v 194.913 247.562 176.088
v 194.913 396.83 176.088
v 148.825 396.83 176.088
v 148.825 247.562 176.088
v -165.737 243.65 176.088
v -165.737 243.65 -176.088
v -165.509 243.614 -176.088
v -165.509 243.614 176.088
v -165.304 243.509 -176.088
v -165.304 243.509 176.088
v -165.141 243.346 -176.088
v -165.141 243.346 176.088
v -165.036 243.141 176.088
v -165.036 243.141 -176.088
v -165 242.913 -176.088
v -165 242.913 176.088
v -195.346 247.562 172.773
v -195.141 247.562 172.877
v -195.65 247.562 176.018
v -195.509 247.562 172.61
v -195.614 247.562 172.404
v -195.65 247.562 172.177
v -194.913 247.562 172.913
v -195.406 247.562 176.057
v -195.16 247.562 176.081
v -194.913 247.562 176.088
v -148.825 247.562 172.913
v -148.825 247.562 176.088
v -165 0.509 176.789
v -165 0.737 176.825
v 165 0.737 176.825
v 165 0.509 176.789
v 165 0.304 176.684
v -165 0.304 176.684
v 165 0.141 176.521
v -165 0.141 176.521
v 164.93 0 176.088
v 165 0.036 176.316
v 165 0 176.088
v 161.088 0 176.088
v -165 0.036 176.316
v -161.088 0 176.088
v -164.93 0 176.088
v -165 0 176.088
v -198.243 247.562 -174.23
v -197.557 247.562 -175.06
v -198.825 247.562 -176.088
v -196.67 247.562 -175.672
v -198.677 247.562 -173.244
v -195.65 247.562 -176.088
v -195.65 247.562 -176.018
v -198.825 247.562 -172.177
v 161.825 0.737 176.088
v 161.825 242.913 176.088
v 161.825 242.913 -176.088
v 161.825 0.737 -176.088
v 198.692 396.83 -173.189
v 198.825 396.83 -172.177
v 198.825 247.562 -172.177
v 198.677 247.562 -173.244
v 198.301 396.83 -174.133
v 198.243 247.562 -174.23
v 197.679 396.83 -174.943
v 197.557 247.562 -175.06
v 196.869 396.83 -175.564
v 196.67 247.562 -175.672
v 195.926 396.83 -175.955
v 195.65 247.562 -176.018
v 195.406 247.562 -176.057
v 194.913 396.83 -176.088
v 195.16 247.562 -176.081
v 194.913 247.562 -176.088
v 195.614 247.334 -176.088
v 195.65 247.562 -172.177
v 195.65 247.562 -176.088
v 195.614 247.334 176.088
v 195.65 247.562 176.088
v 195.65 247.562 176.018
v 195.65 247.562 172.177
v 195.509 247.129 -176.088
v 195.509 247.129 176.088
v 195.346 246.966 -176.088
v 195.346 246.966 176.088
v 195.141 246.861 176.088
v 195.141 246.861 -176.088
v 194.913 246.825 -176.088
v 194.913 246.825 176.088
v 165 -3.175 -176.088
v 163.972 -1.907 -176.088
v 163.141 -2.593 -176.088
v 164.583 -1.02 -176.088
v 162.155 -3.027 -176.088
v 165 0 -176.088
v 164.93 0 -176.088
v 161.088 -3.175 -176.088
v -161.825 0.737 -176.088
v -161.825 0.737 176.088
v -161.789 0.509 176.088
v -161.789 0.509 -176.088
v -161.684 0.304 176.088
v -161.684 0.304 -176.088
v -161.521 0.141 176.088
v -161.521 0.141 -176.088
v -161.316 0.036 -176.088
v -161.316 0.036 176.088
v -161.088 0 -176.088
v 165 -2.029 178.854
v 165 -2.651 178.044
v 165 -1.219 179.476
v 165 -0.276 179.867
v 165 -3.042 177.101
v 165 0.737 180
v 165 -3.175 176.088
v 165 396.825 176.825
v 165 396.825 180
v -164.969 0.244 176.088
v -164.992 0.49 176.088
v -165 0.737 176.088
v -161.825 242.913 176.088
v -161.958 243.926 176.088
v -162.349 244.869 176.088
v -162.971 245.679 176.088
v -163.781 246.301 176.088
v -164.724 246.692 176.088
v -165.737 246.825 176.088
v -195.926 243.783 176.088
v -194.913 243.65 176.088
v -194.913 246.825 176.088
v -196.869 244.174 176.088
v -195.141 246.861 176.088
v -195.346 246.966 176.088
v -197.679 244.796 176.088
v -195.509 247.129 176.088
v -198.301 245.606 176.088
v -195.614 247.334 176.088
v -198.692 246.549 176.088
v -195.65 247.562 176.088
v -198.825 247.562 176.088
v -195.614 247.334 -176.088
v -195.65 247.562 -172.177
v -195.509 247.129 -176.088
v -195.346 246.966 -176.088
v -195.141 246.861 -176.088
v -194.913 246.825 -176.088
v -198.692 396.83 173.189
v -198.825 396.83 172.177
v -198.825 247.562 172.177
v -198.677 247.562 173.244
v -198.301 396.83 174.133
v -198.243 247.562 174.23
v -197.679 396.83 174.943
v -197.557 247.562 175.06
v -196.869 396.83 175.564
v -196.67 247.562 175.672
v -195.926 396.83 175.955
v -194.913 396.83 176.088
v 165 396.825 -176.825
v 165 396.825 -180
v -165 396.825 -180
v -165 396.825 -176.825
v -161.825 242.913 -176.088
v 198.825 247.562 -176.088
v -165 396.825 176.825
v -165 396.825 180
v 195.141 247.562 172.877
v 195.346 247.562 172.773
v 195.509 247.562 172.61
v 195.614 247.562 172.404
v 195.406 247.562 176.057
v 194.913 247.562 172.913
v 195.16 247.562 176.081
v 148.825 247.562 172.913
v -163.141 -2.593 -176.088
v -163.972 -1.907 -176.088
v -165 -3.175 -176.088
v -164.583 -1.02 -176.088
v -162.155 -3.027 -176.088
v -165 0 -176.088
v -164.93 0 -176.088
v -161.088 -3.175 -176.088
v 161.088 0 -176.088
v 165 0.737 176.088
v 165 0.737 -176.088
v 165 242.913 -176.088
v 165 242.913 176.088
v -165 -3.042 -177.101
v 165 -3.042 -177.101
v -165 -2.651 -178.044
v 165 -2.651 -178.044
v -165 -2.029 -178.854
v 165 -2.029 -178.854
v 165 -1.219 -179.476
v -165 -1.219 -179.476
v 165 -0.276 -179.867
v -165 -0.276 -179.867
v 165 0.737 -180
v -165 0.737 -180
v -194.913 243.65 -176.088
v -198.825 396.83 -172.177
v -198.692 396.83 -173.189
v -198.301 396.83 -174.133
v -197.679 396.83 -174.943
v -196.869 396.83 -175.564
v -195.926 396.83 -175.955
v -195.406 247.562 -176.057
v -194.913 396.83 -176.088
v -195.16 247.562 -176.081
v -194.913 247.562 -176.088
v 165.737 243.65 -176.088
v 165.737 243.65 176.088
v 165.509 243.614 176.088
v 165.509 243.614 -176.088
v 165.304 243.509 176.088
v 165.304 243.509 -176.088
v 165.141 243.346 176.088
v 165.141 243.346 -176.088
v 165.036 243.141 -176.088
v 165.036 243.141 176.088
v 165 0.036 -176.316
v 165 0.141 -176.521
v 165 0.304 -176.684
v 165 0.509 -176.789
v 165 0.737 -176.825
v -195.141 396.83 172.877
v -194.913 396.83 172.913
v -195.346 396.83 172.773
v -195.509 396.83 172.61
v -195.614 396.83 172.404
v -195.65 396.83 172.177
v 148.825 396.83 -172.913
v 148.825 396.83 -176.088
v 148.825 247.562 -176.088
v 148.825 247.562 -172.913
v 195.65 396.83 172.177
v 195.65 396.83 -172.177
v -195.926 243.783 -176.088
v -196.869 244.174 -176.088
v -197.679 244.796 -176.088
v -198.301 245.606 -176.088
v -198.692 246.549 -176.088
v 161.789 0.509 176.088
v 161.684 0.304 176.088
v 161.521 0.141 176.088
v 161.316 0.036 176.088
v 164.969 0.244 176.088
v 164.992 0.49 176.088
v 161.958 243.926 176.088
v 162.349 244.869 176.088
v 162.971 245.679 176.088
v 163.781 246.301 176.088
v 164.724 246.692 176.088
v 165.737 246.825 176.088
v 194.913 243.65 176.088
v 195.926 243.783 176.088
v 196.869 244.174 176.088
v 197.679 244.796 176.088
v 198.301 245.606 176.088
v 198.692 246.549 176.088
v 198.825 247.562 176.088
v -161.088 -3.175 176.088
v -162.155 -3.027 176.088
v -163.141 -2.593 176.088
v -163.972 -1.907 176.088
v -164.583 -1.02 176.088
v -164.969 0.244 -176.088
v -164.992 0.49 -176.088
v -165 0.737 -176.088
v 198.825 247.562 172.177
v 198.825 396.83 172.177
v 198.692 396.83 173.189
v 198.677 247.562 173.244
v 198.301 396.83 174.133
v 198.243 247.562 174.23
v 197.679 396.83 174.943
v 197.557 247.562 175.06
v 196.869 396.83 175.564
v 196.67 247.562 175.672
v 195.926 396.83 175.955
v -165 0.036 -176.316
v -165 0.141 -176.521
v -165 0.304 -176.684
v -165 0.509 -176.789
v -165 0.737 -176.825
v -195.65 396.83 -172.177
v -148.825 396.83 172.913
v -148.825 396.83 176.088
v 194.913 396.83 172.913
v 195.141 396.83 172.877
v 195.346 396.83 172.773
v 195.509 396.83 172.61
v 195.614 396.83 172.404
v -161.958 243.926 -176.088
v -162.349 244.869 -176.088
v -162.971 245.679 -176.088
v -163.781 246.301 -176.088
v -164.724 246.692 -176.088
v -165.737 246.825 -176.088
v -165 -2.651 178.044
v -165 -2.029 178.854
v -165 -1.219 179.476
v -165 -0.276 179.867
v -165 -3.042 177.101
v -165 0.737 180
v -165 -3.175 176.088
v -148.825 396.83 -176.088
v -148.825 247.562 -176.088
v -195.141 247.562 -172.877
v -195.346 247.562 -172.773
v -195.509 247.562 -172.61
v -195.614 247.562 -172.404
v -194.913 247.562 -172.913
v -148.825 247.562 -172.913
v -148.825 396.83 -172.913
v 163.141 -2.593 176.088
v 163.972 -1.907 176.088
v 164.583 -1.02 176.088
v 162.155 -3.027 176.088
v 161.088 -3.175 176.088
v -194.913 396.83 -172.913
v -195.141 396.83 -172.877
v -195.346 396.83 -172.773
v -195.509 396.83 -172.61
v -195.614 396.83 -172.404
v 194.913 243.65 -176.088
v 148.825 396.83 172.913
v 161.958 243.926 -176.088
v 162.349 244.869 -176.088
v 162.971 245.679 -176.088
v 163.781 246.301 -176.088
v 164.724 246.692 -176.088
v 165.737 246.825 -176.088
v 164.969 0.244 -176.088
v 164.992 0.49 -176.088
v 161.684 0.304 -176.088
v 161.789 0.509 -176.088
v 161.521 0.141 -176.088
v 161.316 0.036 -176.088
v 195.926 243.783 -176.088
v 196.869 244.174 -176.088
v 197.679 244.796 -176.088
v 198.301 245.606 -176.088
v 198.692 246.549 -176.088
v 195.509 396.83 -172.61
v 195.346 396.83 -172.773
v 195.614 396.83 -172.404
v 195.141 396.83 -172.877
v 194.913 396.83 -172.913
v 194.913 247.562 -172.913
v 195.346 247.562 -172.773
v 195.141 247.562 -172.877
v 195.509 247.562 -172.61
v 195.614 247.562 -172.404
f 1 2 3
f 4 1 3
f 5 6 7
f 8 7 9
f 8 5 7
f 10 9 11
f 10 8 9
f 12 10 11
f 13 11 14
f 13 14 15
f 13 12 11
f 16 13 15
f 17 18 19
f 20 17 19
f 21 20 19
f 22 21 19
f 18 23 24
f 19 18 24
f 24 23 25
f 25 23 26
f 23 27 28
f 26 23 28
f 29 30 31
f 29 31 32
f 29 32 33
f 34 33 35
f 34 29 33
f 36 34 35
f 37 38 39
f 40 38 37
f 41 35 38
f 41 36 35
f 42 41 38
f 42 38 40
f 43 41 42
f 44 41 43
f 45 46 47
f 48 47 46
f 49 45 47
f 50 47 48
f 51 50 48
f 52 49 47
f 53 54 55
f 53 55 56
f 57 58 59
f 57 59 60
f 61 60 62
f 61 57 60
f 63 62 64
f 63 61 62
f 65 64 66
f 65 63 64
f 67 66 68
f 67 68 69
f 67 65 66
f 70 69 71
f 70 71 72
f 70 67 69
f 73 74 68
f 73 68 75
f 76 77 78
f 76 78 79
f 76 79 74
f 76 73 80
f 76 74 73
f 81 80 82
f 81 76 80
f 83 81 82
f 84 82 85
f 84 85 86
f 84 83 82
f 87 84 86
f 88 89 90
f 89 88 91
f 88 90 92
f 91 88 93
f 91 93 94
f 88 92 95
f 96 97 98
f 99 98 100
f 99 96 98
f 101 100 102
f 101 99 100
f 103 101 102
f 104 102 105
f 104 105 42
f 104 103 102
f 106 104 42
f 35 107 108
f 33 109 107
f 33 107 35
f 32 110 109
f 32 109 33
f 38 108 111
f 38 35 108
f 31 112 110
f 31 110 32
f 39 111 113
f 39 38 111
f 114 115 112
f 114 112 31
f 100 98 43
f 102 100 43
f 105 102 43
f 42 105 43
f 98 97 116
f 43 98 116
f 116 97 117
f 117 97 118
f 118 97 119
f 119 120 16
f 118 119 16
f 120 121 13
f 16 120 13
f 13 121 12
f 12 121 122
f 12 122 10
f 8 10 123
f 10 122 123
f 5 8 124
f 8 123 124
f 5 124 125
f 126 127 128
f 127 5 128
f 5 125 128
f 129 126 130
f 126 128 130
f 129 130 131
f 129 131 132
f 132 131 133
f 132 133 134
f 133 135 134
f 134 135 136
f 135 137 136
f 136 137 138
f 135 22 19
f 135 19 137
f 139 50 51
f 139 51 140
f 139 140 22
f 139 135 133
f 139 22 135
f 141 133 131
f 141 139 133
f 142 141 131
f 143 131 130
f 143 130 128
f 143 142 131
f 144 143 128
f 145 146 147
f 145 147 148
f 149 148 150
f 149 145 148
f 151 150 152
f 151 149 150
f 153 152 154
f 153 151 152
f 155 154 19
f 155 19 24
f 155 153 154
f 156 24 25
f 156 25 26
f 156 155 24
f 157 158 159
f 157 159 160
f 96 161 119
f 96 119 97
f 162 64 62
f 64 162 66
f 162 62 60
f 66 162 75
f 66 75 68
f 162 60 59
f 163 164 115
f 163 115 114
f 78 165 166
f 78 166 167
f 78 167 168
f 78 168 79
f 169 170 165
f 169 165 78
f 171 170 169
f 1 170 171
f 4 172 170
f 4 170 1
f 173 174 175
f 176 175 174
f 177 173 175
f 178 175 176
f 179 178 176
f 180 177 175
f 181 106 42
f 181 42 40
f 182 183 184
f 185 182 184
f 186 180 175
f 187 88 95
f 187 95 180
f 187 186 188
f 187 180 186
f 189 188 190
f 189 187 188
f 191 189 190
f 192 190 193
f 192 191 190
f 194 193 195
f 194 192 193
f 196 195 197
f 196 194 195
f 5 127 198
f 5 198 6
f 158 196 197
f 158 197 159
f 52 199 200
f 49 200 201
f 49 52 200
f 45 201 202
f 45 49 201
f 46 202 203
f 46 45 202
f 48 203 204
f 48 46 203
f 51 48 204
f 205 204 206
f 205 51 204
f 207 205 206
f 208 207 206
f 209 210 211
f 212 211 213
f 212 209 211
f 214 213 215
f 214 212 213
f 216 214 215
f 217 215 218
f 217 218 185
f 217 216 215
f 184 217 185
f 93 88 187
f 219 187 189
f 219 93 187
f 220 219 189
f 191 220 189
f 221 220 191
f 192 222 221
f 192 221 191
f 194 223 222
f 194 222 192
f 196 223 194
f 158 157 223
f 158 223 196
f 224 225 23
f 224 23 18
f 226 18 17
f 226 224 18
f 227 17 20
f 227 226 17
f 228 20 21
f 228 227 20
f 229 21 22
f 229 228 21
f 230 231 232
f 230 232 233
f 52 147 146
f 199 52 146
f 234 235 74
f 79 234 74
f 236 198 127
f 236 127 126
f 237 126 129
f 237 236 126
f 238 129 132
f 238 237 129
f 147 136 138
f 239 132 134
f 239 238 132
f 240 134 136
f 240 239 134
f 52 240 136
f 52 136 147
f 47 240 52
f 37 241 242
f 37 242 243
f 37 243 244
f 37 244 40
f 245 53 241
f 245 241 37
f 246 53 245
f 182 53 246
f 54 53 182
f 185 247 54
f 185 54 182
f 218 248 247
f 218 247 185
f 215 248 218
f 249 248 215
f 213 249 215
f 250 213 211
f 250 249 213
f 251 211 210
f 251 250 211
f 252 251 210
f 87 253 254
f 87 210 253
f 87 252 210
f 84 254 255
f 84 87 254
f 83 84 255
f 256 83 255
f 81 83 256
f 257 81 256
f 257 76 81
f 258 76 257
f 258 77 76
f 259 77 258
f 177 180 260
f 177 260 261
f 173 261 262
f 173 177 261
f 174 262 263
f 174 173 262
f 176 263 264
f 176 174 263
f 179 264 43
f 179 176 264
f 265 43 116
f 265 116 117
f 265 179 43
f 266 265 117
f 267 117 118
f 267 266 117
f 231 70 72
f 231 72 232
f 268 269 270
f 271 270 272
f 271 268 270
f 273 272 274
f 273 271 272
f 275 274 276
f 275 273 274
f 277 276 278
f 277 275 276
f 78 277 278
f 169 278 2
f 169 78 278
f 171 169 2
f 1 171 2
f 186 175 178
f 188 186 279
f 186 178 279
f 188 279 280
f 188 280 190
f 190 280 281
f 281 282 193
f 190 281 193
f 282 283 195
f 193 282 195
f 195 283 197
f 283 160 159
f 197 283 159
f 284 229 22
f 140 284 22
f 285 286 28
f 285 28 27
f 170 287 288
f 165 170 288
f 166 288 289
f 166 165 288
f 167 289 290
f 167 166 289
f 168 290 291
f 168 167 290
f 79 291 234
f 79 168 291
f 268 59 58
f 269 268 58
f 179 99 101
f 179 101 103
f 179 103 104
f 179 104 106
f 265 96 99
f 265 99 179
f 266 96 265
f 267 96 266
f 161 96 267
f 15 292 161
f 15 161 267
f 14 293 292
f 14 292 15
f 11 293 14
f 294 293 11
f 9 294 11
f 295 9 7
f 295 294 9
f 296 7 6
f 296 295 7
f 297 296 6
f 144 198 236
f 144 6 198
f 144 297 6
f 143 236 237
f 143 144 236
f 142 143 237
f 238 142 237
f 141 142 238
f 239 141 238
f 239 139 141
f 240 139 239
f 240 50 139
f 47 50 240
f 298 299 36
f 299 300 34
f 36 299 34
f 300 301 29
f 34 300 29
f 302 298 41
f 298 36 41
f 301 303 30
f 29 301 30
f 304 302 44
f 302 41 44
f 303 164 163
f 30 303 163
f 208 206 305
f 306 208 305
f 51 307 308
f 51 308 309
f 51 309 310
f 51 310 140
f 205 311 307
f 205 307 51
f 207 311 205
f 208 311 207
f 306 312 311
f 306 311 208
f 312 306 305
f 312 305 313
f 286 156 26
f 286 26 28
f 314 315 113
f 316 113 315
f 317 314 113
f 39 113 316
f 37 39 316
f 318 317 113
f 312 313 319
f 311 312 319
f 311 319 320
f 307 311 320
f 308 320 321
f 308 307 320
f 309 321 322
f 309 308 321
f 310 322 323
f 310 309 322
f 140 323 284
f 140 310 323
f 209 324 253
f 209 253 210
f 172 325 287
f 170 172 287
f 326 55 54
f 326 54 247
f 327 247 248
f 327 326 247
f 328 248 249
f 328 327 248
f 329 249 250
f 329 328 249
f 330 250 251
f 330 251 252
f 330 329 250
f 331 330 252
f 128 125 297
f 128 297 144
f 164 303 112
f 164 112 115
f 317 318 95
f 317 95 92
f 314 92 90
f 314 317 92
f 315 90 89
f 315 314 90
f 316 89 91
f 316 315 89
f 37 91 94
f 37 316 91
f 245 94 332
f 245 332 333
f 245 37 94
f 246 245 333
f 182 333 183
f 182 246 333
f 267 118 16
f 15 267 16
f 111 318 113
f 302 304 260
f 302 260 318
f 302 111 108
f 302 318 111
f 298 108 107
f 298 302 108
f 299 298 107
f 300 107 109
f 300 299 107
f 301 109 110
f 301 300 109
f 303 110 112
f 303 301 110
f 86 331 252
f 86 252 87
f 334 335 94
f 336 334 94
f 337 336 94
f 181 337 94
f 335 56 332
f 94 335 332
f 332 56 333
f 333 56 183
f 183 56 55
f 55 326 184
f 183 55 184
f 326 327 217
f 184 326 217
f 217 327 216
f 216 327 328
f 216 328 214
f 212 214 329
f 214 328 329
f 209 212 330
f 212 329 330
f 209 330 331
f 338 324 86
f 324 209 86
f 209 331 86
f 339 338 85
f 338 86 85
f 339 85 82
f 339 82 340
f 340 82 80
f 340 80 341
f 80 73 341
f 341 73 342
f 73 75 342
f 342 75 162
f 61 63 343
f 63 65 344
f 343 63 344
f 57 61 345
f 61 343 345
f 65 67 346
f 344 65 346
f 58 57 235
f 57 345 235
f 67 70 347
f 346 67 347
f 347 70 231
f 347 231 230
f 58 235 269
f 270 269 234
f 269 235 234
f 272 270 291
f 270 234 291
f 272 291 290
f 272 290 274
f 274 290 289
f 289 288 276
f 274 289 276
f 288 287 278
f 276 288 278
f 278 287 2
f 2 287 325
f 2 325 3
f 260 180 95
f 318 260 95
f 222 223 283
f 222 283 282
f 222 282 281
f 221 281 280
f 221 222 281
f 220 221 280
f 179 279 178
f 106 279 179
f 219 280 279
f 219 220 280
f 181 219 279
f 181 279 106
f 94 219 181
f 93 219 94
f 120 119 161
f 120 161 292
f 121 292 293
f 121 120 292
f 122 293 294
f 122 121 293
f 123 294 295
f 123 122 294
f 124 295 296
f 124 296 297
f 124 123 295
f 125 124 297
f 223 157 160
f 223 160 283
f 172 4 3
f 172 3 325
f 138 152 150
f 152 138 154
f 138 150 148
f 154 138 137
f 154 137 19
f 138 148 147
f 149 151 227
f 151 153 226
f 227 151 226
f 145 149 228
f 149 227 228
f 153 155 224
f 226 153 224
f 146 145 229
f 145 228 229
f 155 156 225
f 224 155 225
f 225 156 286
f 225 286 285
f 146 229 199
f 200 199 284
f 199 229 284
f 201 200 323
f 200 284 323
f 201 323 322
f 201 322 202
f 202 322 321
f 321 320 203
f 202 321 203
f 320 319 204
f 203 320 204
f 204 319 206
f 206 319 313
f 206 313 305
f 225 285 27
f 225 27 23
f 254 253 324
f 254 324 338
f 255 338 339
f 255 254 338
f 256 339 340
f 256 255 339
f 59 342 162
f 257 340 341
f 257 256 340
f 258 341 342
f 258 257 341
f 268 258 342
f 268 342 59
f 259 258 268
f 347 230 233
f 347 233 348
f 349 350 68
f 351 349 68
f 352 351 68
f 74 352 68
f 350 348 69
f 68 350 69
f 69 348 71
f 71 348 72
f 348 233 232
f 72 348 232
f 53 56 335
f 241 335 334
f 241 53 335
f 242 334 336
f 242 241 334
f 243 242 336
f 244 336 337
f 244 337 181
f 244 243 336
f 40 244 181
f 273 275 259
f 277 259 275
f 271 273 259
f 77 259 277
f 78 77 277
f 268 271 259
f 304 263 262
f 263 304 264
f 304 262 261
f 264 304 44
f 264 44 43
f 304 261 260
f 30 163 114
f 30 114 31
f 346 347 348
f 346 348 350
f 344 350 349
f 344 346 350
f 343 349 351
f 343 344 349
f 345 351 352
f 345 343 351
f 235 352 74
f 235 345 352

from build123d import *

# Parameters (mm, degrees)
SKETCH6_W                       = 330
SKETCH6_H                       = 360
BASE_FLANGE2_DEPTH              = 3.175
EDGE_FLANGE4_STRIP_W            = 14.1732
EDGE_FLANGE4_STRIP_H            = 3.175
EDGE_FLANGE4_STRIP_CUT_DEPTH    = 330
EDGE_FLANGE4_DEPTH              = 330
EDGE_FLANGE5_STRIP_W            = 14.1732
EDGE_FLANGE5_STRIP_H            = 3.175
EDGE_FLANGE5_STRIP_CUT_DEPTH    = 330
EDGE_FLANGE5_DEPTH              = 330
EDGE_FLANGE6_STRIP_W            = 14.1732
EDGE_FLANGE6_STRIP_H            = 3.175
EDGE_FLANGE6_STRIP_CUT_DEPTH    = 352.1768
EDGE_FLANGE6_DEPTH              = 352.1768
EDGE_FLANGE7_STRIP_W            = 14.1732
EDGE_FLANGE7_STRIP_H            = 3.175
EDGE_FLANGE7_STRIP_CUT_DEPTH    = 352.1768
EDGE_FLANGE7_DEPTH              = 352.1768
EDGE_FLANGE10_STRIP_W           = 14.1732
EDGE_FLANGE10_STRIP_H           = 3.175
EDGE_FLANGE10_STRIP_CUT_DEPTH   = 352.1768
EDGE_FLANGE10_DEPTH             = 352.1768
EDGE_FLANGE11_STRIP_W           = 14.1732
EDGE_FLANGE11_STRIP_H           = 3.175
EDGE_FLANGE11_STRIP_CUT_DEPTH   = 352.1768
EDGE_FLANGE11_DEPTH             = 352.1768
EDGE_FLANGE12_STRIP_W           = 14.1732
EDGE_FLANGE12_STRIP_H           = 3.175
EDGE_FLANGE12_STRIP_CUT_DEPTH   = 352.1768
EDGE_FLANGE12_DEPTH             = 352.1768
EDGE_FLANGE13_STRIP_W           = 14.1732
EDGE_FLANGE13_STRIP_H           = 3.175
EDGE_FLANGE13_STRIP_CUT_DEPTH   = 352.1768
EDGE_FLANGE13_DEPTH             = 352.1768
EDGE_FLANGE14_STRIP_W           = 14.1732
EDGE_FLANGE14_STRIP_H           = 3.175
EDGE_FLANGE14_STRIP_CUT_DEPTH   = 149.2684
EDGE_FLANGE14_STRIP_2_W         = 14.1732
EDGE_FLANGE14_STRIP_2_H         = 3.175
EDGE_FLANGE14_STRIP_CUT_2_DEPTH = 149.2684
EDGE_FLANGE14_STRIP_3_W         = 14.1732
EDGE_FLANGE14_STRIP_3_H         = 3.175
EDGE_FLANGE14_STRIP_CUT_3_DEPTH = 149.2684
EDGE_FLANGE14_STRIP_4_W         = 14.1732
EDGE_FLANGE14_STRIP_4_H         = 3.175
EDGE_FLANGE14_STRIP_CUT_4_DEPTH = 149.2684
EDGE_FLANGE14_DEPTH             = 149.2684
EDGE_FLANGE14_BEND_DEPTH        = 149.2684
EDGE_FLANGE14_BEND_2_DEPTH      = 149.2684
EDGE_FLANGE14_BEND_3_DEPTH      = 149.2684


# Sheet-metal steps are written as plain solids
with BuildPart() as part:
    # Sketch6 → Base-Flange2 (new body)
    with BuildSketch(Plane(origin=(0, 0, 0), x_dir=(1, 0, 0), z_dir=(0, 1, 0))):
        Rectangle(SKETCH6_W, SKETCH6_H)
    extrude(amount=-BASE_FLANGE2_DEPTH)

    # Edge-Flange4 strip (across the edge) → Edge-Flange4 strip cut (cut)
    with BuildSketch(Plane(origin=(-165, 0, 180), x_dir=(0, 0, -1), z_dir=(1, 0, 0))):
        with Locations((-3.175, -1.5875)):
            Rectangle(EDGE_FLANGE4_STRIP_W, EDGE_FLANGE4_STRIP_H)
    extrude(amount=EDGE_FLANGE4_STRIP_CUT_DEPTH, mode=Mode.SUBTRACT)

    # Edge-Flange4 section (across the edge) → Edge-Flange4 (add)
    with BuildSketch(Plane(origin=(-165, 0, 180), x_dir=(0, 0, -1), z_dir=(1, 0, 0))):
        with BuildLine():
            Line((0, 0.7366), (0, 396.825))
            Line((0, 396.825), (3.175, 396.825))
            Line((3.175, 396.825), (3.175, 0.7366))
            ThreePointArc((3.175, 0.7366), (3.390745145, 0.215745145), (3.9116, 0))
            Line((3.9116, 0), (3.9116, -3.175))
            ThreePointArc((3.9116, -3.175), (1.145681115, -2.029318885), (0, 0.7366))
        make_face()
    extrude(amount=EDGE_FLANGE4_DEPTH)

    # Edge-Flange5 strip (across the edge) → Edge-Flange5 strip cut (cut)
    with BuildSketch(Plane(origin=(165, 0, -180), x_dir=(0, 0, 1), z_dir=(-1, 0, 0))):
        with Locations((-3.175, -1.5875)):
            Rectangle(EDGE_FLANGE5_STRIP_W, EDGE_FLANGE5_STRIP_H)
    extrude(amount=EDGE_FLANGE5_STRIP_CUT_DEPTH, mode=Mode.SUBTRACT)

    # Edge-Flange5 section (across the edge) → Edge-Flange5 (add)
    with BuildSketch(Plane(origin=(165, 0, -180), x_dir=(0, 0, 1), z_dir=(-1, 0, 0))):
        with BuildLine():
            Line((0, 0.7366), (0, 396.825))
            Line((0, 396.825), (3.175, 396.825))
            Line((3.175, 396.825), (3.175, 0.7366))
            ThreePointArc((3.175, 0.7366), (3.390745145, 0.215745145), (3.9116, 0))
            Line((3.9116, 0), (3.9116, -3.175))
            ThreePointArc((3.9116, -3.175), (1.145681115, -2.029318885), (0, 0.7366))
        make_face()
    extrude(amount=EDGE_FLANGE5_DEPTH)

    # Edge-Flange6 strip (across the edge) → Edge-Flange6 strip cut (cut)
    with BuildSketch(Plane(origin=(165, 0, 176.0884), x_dir=(-1, 0, 0), z_dir=(0, 0, -1))):
        with Locations((-3.175, -1.5875)):
            Rectangle(EDGE_FLANGE6_STRIP_W, EDGE_FLANGE6_STRIP_H)
    extrude(amount=EDGE_FLANGE6_STRIP_CUT_DEPTH, mode=Mode.SUBTRACT)

    # Edge-Flange6 section (across the edge) → Edge-Flange6 (add)
    with BuildSketch(Plane(origin=(165, 0, 176.0884), x_dir=(-1, 0, 0), z_dir=(0, 0, -1))):
        with BuildLine():
            Line((0, 0.7366), (0, 246.825))
            Line((0, 246.825), (3.175, 246.825))
            Line((3.175, 246.825), (3.175, 0.7366))
            ThreePointArc((3.175, 0.7366), (3.390745145, 0.215745145), (3.9116, 0))
            Line((3.9116, 0), (3.9116, -3.175))
            ThreePointArc((3.9116, -3.175), (1.145681115, -2.029318885), (0, 0.7366))
        make_face()
    extrude(amount=EDGE_FLANGE6_DEPTH)

    # Edge-Flange7 strip (across the edge) → Edge-Flange7 strip cut (cut)
    with BuildSketch(Plane(origin=(-165, 0, -176.0884), x_dir=(1, 0, 0), z_dir=(0, 0, 1))):
        with Locations((-3.175, -1.5875)):
            Rectangle(EDGE_FLANGE7_STRIP_W, EDGE_FLANGE7_STRIP_H)
    extrude(amount=EDGE_FLANGE7_STRIP_CUT_DEPTH, mode=Mode.SUBTRACT)

    # Edge-Flange7 section (across the edge) → Edge-Flange7 (add)
    with BuildSketch(Plane(origin=(-165, 0, -176.0884), x_dir=(1, 0, 0), z_dir=(0, 0, 1))):
        with BuildLine():
            Line((0, 0.7366), (0, 246.825))
            Line((0, 246.825), (3.175, 246.825))
            Line((3.175, 246.825), (3.175, 0.7366))
            ThreePointArc((3.175, 0.7366), (3.390745145, 0.215745145), (3.9116, 0))
            Line((3.9116, 0), (3.9116, -3.175))
            ThreePointArc((3.9116, -3.175), (1.145681115, -2.029318885), (0, 0.7366))
        make_face()
    extrude(amount=EDGE_FLANGE7_DEPTH)

    # Edge-Flange10 strip (across the edge) → Edge-Flange10 strip cut (cut)
    with BuildSketch(Plane(origin=(-165, 246.825, 176.0884), x_dir=(0, -1, 0), z_dir=(0, 0, -1))):
        with Locations((-3.175, -1.5875)):
            Rectangle(EDGE_FLANGE10_STRIP_W, EDGE_FLANGE10_STRIP_H)
    extrude(amount=EDGE_FLANGE10_STRIP_CUT_DEPTH, mode=Mode.SUBTRACT)

    # Edge-Flange10 section (across the edge) → Edge-Flange10 (add)
    with BuildSketch(Plane(origin=(-165, 246.825, 176.0884), x_dir=(0, -1, 0), z_dir=(0, 0, -1))):
        with BuildLine():
            Line((0, 0.7366), (0, 33.825))
            Line((0, 33.825), (3.175, 33.825))
            Line((3.175, 33.825), (3.175, 0.7366))
            ThreePointArc((3.175, 0.7366), (3.390745145, 0.215745145), (3.9116, 0))
            Line((3.9116, 0), (3.9116, -3.175))
            ThreePointArc((3.9116, -3.175), (1.145681115, -2.029318885), (0, 0.7366))
        make_face()
    extrude(amount=EDGE_FLANGE10_DEPTH)

    # Edge-Flange11 strip (across the edge) → Edge-Flange11 strip cut (cut)
    with BuildSketch(Plane(origin=(165, 246.825, -176.0884), x_dir=(0, -1, 0), z_dir=(0, 0, 1))):
        with Locations((-3.175, -1.5875)):
            Rectangle(EDGE_FLANGE11_STRIP_W, EDGE_FLANGE11_STRIP_H)
    extrude(amount=EDGE_FLANGE11_STRIP_CUT_DEPTH, mode=Mode.SUBTRACT)

    # Edge-Flange11 section (across the edge) → Edge-Flange11 (add)
    with BuildSketch(Plane(origin=(165, 246.825, -176.0884), x_dir=(0, -1, 0), z_dir=(0, 0, 1))):
        with BuildLine():
            Line((0, 0.7366), (0, 33.825))
            Line((0, 33.825), (3.175, 33.825))
            Line((3.175, 33.825), (3.175, 0.7366))
            ThreePointArc((3.175, 0.7366), (3.390745145, 0.215745145), (3.9116, 0))
            Line((3.9116, 0), (3.9116, -3.175))
            ThreePointArc((3.9116, -3.175), (1.145681115, -2.029318885), (0, 0.7366))
        make_face()
    extrude(amount=EDGE_FLANGE11_DEPTH)

    # Edge-Flange12 strip (across the edge) → Edge-Flange12 strip cut (cut)
    with BuildSketch(Plane(origin=(-198.825, 246.825, -176.0884), x_dir=(1, 0, 0), z_dir=(0, 0, 1))):
        with Locations((-3.175, -1.5875)):
            Rectangle(EDGE_FLANGE12_STRIP_W, EDGE_FLANGE12_STRIP_H)
    extrude(amount=EDGE_FLANGE12_STRIP_CUT_DEPTH, mode=Mode.SUBTRACT)

    # Edge-Flange12 section (across the edge) → Edge-Flange12 (add)
    with BuildSketch(Plane(origin=(-198.825, 246.825, -176.0884), x_dir=(1, 0, 0), z_dir=(0, 0, 1))):
        with BuildLine():
            Line((0, 0.7366), (0, 150.005))
            Line((0, 150.005), (3.175, 150.005))
            Line((3.175, 150.005), (3.175, 0.7366))
            ThreePointArc((3.175, 0.7366), (3.390745145, 0.215745145), (3.9116, 0))
            Line((3.9116, 0), (3.9116, -3.175))
            ThreePointArc((3.9116, -3.175), (1.145681115, -2.029318885), (0, 0.7366))
        make_face()
    extrude(amount=EDGE_FLANGE12_DEPTH)

    # Edge-Flange13 strip (across the edge) → Edge-Flange13 strip cut (cut)
    with BuildSketch(Plane(origin=(198.825, 246.825, 176.0884), x_dir=(-1, 0, 0), z_dir=(0, 0, -1))):
        with Locations((-3.175, -1.5875)):
            Rectangle(EDGE_FLANGE13_STRIP_W, EDGE_FLANGE13_STRIP_H)
    extrude(amount=EDGE_FLANGE13_STRIP_CUT_DEPTH, mode=Mode.SUBTRACT)

    # Edge-Flange13 section (across the edge) → Edge-Flange13 (add)
    with BuildSketch(Plane(origin=(198.825, 246.825, 176.0884), x_dir=(-1, 0, 0), z_dir=(0, 0, -1))):
        with BuildLine():
            Line((0, 0.7366), (0, 150.005))
            Line((0, 150.005), (3.175, 150.005))
            Line((3.175, 150.005), (3.175, 0.7366))
            ThreePointArc((3.175, 0.7366), (3.390745145, 0.215745145), (3.9116, 0))
            Line((3.9116, 0), (3.9116, -3.175))
            ThreePointArc((3.9116, -3.175), (1.145681115, -2.029318885), (0, 0.7366))
        make_face()
    extrude(amount=EDGE_FLANGE13_DEPTH)

    # Edge-Flange14 strip (across the edge) → Edge-Flange14 strip cut (cut)
    with BuildSketch(Plane(origin=(-195.65, 396.83, 176.0884), x_dir=(0, 0, -1), z_dir=(0, -1, 0))):
        with Locations((-3.175, -1.5875)):
            Rectangle(EDGE_FLANGE14_STRIP_W, EDGE_FLANGE14_STRIP_H)
    extrude(amount=EDGE_FLANGE14_STRIP_CUT_DEPTH, mode=Mode.SUBTRACT)

    # Edge-Flange14 strip 2 (across the edge) → Edge-Flange14 strip cut 2 (cut)
    with BuildSketch(Plane(origin=(-195.65, 247.5616, -176.0884), x_dir=(0, 0, 1), z_dir=(0, 1, 0))):
        with Locations((-3.175, -1.5875)):
            Rectangle(EDGE_FLANGE14_STRIP_2_W, EDGE_FLANGE14_STRIP_2_H)
    extrude(amount=EDGE_FLANGE14_STRIP_CUT_2_DEPTH, mode=Mode.SUBTRACT)

    # Edge-Flange14 strip 3 (across the edge) → Edge-Flange14 strip cut 3 (cut)
    with BuildSketch(Plane(origin=(195.65, 396.83, -176.0884), x_dir=(0, 0, 1), z_dir=(0, -1, 0))):
        with Locations((-3.175, -1.5875)):
            Rectangle(EDGE_FLANGE14_STRIP_3_W, EDGE_FLANGE14_STRIP_3_H)
    extrude(amount=EDGE_FLANGE14_STRIP_CUT_3_DEPTH, mode=Mode.SUBTRACT)

    # Edge-Flange14 strip 4 (across the edge) → Edge-Flange14 strip cut 4 (cut)
    with BuildSketch(Plane(origin=(195.65, 247.5616, 176.0884), x_dir=(0, 0, -1), z_dir=(0, 1, 0))):
        with Locations((-3.175, -1.5875)):
            Rectangle(EDGE_FLANGE14_STRIP_4_W, EDGE_FLANGE14_STRIP_4_H)
    extrude(amount=EDGE_FLANGE14_STRIP_CUT_4_DEPTH, mode=Mode.SUBTRACT)

    # Edge-Flange14 section (across the edge) → Edge-Flange14 (add)
    with BuildSketch(Plane(origin=(-195.65, 396.83, 176.0884), x_dir=(0, 0, -1), z_dir=(0, -1, 0))):
        with BuildLine():
            Line((0, 0.7366), (0, 46.825))
            Line((0, 46.825), (3.175, 46.825))
            Line((3.175, 46.825), (3.175, 0.7366))
            ThreePointArc((3.175, 0.7366), (3.390745145, 0.215745145), (3.9116, 0))
            Line((3.9116, 0), (3.9116, -3.175))
            ThreePointArc((3.9116, -3.175), (1.145681115, -2.029318885), (0, 0.7366))
        make_face()
    extrude(amount=EDGE_FLANGE14_DEPTH)

    # Edge-Flange14 section 2 (across the edge) → Edge-Flange14 bend (add)
    with BuildSketch(Plane(origin=(-195.65, 247.5616, -176.0884), x_dir=(0, 0, 1), z_dir=(0, 1, 0))):
        with BuildLine():
            Line((0, 0.7366), (0, 46.825))
            Line((0, 46.825), (3.175, 46.825))
            Line((3.175, 46.825), (3.175, 0.7366))
            ThreePointArc((3.175, 0.7366), (3.390745145, 0.215745145), (3.9116, 0))
            Line((3.9116, 0), (3.9116, -3.175))
            ThreePointArc((3.9116, -3.175), (1.145681115, -2.029318885), (0, 0.7366))
        make_face()
    extrude(amount=EDGE_FLANGE14_BEND_DEPTH)

    # Edge-Flange14 section 3 (across the edge) → Edge-Flange14 bend 2 (add)
    with BuildSketch(Plane(origin=(195.65, 396.83, -176.0884), x_dir=(0, 0, 1), z_dir=(0, -1, 0))):
        with BuildLine():
            Line((0, 0.7366), (0, 46.825))
            Line((0, 46.825), (3.175, 46.825))
            Line((3.175, 46.825), (3.175, 0.7366))
            ThreePointArc((3.175, 0.7366), (3.390745145, 0.215745145), (3.9116, 0))
            Line((3.9116, 0), (3.9116, -3.175))
            ThreePointArc((3.9116, -3.175), (1.145681115, -2.029318885), (0, 0.7366))
        make_face()
    extrude(amount=EDGE_FLANGE14_BEND_2_DEPTH)

    # Edge-Flange14 section 4 (across the edge) → Edge-Flange14 bend 3 (add)
    with BuildSketch(Plane(origin=(195.65, 247.5616, 176.0884), x_dir=(0, 0, -1), z_dir=(0, 1, 0))):
        with BuildLine():
            Line((0, 0.7366), (0, 46.825))
            Line((0, 46.825), (3.175, 46.825))
            Line((3.175, 46.825), (3.175, 0.7366))
            ThreePointArc((3.175, 0.7366), (3.390745145, 0.215745145), (3.9116, 0))
            Line((3.9116, 0), (3.9116, -3.175))
            ThreePointArc((3.9116, -3.175), (1.145681115, -2.029318885), (0, 0.7366))
        make_face()
    extrude(amount=EDGE_FLANGE14_BEND_3_DEPTH)


solid = part.part
